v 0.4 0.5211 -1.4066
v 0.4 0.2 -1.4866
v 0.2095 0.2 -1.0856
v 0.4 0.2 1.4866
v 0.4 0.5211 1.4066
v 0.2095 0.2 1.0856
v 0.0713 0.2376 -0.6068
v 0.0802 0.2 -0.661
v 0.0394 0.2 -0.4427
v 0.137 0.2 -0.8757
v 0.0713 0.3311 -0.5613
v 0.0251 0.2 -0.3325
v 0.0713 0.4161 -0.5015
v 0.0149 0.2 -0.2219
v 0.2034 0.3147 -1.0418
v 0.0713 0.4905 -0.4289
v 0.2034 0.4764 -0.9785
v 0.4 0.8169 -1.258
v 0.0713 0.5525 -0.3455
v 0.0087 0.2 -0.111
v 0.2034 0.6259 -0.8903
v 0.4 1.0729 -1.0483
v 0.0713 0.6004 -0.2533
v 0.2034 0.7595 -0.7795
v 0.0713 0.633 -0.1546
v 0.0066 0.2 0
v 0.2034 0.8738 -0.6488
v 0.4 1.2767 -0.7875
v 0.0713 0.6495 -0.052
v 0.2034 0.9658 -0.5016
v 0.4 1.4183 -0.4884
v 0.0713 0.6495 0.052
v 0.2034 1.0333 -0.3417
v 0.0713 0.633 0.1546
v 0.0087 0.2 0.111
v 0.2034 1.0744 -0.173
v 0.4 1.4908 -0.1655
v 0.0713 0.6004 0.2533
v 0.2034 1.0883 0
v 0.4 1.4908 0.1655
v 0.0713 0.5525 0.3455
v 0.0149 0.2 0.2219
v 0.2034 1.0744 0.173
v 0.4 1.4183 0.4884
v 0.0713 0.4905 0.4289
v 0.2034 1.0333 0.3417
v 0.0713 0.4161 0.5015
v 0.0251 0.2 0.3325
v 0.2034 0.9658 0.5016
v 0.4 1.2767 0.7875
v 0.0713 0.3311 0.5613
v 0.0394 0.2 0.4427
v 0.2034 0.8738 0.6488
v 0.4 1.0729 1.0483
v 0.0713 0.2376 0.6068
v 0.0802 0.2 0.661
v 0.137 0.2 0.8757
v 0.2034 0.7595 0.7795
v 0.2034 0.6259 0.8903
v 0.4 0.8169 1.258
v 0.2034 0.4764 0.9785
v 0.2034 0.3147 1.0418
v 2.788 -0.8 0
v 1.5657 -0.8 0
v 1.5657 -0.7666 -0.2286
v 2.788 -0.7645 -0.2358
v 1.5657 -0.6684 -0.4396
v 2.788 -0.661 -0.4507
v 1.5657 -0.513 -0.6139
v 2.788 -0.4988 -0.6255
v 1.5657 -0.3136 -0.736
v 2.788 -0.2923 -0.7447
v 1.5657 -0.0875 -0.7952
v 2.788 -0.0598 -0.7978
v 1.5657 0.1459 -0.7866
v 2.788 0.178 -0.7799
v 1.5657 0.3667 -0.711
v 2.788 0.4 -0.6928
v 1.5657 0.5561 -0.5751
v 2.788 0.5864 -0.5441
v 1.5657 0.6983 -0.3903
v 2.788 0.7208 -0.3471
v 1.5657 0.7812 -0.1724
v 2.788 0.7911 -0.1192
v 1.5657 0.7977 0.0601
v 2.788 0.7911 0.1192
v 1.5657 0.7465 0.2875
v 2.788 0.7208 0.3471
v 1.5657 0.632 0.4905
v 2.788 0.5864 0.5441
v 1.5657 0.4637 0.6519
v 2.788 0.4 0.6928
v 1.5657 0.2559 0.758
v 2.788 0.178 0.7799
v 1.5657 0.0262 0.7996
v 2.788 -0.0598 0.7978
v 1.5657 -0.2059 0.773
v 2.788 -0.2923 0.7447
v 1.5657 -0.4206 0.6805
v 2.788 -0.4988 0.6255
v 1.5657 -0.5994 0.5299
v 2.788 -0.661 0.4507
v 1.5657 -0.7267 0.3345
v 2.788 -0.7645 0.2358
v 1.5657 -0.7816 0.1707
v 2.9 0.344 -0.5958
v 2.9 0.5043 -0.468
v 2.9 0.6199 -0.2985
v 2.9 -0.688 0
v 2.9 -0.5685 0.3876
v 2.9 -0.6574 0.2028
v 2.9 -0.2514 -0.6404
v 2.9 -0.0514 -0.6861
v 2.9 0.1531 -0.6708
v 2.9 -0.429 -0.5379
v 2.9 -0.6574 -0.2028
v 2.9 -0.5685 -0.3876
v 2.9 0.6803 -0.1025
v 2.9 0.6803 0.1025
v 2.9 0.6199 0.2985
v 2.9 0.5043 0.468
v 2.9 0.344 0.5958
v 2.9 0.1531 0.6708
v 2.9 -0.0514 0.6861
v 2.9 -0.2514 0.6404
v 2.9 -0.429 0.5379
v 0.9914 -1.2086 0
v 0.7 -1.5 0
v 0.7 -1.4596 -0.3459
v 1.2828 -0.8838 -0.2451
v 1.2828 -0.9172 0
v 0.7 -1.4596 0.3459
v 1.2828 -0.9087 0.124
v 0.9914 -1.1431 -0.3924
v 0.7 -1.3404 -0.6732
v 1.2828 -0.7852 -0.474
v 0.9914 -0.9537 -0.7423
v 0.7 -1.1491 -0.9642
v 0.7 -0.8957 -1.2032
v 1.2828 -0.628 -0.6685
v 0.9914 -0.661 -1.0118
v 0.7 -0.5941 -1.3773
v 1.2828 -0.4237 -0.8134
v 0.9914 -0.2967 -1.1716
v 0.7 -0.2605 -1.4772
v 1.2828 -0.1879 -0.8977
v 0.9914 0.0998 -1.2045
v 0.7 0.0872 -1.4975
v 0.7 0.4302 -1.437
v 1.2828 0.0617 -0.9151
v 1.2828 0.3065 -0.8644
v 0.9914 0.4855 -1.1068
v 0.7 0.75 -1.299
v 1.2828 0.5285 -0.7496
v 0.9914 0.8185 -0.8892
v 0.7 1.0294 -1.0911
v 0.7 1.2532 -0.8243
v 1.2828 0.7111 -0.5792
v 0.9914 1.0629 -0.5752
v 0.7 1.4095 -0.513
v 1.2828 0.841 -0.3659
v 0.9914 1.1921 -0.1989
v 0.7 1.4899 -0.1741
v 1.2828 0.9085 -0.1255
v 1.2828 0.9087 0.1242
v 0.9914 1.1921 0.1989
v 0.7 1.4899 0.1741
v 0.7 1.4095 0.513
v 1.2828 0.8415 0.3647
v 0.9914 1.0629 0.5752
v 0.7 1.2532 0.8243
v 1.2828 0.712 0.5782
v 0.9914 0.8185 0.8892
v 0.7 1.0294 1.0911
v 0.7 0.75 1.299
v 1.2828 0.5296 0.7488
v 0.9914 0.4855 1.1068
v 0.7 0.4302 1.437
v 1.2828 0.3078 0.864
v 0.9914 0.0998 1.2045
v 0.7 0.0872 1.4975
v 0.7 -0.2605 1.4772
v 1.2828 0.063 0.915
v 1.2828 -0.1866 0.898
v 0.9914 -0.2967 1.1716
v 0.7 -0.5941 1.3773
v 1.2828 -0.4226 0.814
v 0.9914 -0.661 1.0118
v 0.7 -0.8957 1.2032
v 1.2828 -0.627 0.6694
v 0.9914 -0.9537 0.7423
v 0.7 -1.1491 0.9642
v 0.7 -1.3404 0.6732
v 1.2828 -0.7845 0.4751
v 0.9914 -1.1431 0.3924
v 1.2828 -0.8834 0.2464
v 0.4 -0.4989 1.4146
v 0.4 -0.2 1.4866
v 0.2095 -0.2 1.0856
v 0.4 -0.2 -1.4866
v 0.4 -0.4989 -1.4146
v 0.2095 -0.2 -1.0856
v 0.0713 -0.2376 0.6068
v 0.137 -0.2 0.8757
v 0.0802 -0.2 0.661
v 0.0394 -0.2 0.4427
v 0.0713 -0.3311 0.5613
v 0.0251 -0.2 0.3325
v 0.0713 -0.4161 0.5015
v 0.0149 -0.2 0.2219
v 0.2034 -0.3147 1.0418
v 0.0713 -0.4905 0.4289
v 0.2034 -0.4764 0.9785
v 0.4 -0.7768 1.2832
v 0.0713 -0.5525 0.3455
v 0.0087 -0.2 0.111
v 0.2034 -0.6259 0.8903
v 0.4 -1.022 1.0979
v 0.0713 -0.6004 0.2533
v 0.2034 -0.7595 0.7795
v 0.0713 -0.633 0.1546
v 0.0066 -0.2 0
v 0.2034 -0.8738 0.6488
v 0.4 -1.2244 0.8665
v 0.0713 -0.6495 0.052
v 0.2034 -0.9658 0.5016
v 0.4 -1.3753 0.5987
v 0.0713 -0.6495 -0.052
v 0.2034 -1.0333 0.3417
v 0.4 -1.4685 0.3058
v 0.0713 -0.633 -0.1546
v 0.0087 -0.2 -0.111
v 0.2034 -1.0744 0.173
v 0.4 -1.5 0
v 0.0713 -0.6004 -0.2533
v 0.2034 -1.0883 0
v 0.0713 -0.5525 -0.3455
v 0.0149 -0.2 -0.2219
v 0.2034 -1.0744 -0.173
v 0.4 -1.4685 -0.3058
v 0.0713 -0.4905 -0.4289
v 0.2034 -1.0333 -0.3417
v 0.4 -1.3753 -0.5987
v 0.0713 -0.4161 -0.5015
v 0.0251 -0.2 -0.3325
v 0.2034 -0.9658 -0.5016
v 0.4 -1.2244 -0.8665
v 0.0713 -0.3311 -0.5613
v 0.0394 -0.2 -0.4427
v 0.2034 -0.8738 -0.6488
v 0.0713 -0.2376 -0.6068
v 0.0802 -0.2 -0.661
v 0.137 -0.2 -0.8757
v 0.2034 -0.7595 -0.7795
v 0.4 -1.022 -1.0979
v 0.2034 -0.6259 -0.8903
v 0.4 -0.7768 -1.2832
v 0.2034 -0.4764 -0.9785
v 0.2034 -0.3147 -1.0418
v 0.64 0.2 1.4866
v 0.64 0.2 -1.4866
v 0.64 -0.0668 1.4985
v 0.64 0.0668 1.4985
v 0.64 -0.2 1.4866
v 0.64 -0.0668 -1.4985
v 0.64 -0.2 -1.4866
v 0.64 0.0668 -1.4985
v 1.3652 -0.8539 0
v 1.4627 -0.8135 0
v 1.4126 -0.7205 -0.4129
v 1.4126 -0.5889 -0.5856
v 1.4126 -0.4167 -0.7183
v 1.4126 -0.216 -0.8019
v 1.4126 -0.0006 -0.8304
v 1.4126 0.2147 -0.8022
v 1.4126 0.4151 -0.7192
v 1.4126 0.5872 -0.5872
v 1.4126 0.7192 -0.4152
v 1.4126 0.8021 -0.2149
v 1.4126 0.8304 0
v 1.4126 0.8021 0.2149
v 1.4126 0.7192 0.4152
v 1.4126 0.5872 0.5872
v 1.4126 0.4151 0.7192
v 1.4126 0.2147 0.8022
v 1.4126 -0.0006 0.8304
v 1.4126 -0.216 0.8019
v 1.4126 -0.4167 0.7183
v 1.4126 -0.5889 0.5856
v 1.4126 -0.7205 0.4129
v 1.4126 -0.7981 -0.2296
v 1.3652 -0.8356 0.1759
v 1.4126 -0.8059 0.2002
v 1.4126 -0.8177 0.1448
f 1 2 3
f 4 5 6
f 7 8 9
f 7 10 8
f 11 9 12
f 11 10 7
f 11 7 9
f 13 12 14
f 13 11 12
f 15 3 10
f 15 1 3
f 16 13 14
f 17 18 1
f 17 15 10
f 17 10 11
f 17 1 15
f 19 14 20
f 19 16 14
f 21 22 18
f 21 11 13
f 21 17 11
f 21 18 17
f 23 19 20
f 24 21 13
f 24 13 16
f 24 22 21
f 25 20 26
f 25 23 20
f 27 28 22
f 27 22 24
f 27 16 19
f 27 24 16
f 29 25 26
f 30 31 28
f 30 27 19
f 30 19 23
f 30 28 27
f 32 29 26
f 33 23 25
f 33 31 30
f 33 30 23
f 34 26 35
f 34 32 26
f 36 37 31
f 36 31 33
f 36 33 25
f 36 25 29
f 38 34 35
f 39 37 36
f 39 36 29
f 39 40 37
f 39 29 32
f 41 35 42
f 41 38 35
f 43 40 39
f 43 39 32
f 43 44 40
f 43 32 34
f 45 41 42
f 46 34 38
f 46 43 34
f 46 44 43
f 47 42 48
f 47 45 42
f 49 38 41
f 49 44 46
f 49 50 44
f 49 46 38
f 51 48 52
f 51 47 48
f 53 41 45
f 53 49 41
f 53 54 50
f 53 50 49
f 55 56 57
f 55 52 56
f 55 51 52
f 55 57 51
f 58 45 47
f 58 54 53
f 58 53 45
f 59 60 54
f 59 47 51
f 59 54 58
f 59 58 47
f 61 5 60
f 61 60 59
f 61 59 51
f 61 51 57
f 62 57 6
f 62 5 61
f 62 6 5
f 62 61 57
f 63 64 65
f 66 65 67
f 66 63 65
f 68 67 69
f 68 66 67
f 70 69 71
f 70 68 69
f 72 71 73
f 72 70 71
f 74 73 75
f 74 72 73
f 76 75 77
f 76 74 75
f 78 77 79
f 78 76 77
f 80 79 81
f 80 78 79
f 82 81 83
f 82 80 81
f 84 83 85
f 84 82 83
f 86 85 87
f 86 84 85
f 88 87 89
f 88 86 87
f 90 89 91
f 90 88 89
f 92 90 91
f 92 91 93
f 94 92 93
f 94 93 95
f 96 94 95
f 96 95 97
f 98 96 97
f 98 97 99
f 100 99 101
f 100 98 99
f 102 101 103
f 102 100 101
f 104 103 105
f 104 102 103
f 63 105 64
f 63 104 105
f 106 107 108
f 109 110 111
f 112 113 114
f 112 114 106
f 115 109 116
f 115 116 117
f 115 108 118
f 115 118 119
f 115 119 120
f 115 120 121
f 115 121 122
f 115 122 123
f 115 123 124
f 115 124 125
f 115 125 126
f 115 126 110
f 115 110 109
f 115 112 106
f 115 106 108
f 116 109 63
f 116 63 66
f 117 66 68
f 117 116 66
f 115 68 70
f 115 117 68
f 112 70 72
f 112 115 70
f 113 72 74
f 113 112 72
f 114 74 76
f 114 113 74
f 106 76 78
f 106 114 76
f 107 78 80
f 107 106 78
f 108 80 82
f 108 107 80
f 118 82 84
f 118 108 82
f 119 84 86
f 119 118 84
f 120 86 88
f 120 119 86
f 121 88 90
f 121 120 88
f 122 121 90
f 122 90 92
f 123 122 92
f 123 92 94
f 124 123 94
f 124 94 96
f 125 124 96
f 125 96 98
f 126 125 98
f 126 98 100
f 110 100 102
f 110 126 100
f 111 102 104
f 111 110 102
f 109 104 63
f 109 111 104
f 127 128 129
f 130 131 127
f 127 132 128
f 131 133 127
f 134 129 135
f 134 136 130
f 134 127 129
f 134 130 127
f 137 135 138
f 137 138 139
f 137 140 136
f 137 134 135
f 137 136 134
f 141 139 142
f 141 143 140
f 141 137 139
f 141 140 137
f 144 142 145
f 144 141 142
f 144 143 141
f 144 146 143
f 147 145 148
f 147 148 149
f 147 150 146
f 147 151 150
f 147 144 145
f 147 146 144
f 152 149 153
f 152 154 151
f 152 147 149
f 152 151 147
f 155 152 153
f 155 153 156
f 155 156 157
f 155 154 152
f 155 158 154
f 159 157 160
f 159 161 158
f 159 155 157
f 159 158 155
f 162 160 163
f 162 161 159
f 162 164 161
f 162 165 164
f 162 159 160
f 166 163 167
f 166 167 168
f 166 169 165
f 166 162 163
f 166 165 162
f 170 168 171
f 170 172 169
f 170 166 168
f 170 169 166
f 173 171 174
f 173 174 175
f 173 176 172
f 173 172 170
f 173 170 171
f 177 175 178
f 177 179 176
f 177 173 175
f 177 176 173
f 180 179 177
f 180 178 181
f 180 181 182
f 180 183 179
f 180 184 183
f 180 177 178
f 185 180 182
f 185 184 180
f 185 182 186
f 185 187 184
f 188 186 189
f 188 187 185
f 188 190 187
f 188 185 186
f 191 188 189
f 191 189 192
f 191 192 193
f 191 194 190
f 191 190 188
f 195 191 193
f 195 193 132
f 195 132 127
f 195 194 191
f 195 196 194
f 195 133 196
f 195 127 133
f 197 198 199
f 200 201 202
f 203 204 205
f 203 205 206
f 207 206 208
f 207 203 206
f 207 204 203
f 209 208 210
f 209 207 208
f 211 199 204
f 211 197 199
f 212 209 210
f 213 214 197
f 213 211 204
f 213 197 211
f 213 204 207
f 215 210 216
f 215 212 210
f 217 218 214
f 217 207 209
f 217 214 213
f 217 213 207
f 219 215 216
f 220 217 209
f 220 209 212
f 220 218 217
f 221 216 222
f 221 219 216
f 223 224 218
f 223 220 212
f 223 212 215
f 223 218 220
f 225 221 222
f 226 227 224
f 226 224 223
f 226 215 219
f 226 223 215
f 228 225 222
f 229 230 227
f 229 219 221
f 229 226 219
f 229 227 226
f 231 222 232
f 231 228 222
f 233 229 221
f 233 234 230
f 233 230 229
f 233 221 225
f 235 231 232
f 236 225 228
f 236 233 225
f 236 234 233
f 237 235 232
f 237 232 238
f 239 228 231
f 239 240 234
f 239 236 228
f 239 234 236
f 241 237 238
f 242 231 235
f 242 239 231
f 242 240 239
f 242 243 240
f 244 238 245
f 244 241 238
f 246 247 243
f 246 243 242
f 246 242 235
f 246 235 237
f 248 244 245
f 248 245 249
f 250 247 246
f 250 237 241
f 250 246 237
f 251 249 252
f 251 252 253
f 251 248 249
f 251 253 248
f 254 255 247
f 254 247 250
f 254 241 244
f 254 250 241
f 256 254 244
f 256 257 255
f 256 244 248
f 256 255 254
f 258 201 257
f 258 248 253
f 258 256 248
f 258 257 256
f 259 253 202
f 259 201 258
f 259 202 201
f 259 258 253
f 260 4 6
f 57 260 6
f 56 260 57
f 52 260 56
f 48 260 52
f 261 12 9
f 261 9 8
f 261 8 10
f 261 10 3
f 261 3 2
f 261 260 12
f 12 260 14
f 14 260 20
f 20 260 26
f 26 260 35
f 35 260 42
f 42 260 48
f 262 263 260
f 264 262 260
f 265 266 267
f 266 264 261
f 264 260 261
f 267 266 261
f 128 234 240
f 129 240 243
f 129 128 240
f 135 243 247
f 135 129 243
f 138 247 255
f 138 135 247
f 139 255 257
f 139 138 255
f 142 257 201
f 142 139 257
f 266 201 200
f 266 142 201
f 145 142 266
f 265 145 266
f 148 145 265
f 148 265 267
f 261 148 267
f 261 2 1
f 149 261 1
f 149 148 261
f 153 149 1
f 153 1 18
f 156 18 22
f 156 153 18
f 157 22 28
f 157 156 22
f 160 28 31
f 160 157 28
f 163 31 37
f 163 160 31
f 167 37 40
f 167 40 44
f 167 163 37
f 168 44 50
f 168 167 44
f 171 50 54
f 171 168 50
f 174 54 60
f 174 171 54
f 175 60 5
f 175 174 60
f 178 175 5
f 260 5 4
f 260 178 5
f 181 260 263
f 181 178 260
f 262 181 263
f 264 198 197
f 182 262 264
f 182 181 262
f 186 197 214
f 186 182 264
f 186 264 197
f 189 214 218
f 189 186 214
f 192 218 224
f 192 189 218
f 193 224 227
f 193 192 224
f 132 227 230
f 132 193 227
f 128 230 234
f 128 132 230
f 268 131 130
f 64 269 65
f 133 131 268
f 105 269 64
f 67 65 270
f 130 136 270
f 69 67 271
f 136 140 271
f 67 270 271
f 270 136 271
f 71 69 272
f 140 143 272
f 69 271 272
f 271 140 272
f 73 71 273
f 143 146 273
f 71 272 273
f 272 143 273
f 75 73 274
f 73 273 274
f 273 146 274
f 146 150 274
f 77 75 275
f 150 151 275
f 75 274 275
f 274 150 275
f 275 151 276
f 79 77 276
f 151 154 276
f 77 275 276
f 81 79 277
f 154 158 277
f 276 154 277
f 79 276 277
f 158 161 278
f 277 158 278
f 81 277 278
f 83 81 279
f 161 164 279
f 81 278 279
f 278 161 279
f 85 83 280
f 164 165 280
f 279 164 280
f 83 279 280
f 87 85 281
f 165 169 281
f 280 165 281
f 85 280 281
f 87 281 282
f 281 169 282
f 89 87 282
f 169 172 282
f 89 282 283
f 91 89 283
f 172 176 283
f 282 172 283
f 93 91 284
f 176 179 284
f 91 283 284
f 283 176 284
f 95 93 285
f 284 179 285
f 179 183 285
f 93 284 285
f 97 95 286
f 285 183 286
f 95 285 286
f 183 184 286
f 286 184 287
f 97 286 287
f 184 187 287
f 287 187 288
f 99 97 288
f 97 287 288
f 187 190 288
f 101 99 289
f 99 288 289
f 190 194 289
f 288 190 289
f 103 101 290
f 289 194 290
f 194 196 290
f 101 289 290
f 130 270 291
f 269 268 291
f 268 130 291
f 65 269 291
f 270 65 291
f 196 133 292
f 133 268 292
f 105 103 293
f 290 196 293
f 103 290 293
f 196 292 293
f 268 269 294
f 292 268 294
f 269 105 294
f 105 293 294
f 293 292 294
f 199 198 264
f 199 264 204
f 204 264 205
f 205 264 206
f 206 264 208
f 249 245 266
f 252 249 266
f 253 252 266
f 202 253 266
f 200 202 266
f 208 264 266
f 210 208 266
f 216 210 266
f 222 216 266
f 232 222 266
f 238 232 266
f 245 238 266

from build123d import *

# Parameters (mm, degrees)
SKICA2_W                 = 3
SKICA2_H                 = 0.4
ODEBRAT_VYSUNUT_M1_DEPTH = 4.099612879
ZAOBLIT1_R               = 0.4
ZKOSIT1_SIZE             = 0.112


with BuildPart() as part:
    # Skica1 → Otočit kolem osy1 (revolve)
    with BuildSketch(Plane.XY, mode=Mode.PRIVATE) as oto_it_kolem_osy1_sk:
        with BuildLine():
            Line((0.4, 1.5), (0.7, 1.5))
            Line((0.7, 1.5), (1.4, 0.8))
            Line((1.4, 0.8), (2.9, 0.8))
            Line((2.9, 0.8), (2.9, 0))
            Line((2.9, 0), (0, 0))
            ThreePointArc((0, 0), (0.101717244, 0.776208735), (0.4, 1.5))
        make_face()
    revolve(oto_it_kolem_osy1_sk.sketch.rotate(Axis((0, 0, 0), (1, 0, 0)), 180), axis=Axis((0, 0, 0), (1, 0, 0)))

    # Skica2 → Odebrat vysunutím1 (cut, through all)
    with BuildSketch(Plane(origin=(0.64, 0, 0), x_dir=(0, 0, -1), z_dir=(1, 0, 0))):
        Rectangle(SKICA2_W, SKICA2_H)
    extrude(amount=-ODEBRAT_VYSUNUT_M1_DEPTH, mode=Mode.SUBTRACT)

    # Zaoblit1
    zaoblit1_edges = [part.edges().sort_by_distance(p)[0] for p in [
        (1.4, 0.8, 0),
    ]]
    fillet(zaoblit1_edges, radius=ZAOBLIT1_R)

    # Zkosit1
    zkosit1_edges = [part.edges().sort_by_distance(p)[0] for p in [
        (2.9, 0.8, 0),
    ]]
    chamfer(zkosit1_edges, length=ZKOSIT1_SIZE)


solid = part.part
